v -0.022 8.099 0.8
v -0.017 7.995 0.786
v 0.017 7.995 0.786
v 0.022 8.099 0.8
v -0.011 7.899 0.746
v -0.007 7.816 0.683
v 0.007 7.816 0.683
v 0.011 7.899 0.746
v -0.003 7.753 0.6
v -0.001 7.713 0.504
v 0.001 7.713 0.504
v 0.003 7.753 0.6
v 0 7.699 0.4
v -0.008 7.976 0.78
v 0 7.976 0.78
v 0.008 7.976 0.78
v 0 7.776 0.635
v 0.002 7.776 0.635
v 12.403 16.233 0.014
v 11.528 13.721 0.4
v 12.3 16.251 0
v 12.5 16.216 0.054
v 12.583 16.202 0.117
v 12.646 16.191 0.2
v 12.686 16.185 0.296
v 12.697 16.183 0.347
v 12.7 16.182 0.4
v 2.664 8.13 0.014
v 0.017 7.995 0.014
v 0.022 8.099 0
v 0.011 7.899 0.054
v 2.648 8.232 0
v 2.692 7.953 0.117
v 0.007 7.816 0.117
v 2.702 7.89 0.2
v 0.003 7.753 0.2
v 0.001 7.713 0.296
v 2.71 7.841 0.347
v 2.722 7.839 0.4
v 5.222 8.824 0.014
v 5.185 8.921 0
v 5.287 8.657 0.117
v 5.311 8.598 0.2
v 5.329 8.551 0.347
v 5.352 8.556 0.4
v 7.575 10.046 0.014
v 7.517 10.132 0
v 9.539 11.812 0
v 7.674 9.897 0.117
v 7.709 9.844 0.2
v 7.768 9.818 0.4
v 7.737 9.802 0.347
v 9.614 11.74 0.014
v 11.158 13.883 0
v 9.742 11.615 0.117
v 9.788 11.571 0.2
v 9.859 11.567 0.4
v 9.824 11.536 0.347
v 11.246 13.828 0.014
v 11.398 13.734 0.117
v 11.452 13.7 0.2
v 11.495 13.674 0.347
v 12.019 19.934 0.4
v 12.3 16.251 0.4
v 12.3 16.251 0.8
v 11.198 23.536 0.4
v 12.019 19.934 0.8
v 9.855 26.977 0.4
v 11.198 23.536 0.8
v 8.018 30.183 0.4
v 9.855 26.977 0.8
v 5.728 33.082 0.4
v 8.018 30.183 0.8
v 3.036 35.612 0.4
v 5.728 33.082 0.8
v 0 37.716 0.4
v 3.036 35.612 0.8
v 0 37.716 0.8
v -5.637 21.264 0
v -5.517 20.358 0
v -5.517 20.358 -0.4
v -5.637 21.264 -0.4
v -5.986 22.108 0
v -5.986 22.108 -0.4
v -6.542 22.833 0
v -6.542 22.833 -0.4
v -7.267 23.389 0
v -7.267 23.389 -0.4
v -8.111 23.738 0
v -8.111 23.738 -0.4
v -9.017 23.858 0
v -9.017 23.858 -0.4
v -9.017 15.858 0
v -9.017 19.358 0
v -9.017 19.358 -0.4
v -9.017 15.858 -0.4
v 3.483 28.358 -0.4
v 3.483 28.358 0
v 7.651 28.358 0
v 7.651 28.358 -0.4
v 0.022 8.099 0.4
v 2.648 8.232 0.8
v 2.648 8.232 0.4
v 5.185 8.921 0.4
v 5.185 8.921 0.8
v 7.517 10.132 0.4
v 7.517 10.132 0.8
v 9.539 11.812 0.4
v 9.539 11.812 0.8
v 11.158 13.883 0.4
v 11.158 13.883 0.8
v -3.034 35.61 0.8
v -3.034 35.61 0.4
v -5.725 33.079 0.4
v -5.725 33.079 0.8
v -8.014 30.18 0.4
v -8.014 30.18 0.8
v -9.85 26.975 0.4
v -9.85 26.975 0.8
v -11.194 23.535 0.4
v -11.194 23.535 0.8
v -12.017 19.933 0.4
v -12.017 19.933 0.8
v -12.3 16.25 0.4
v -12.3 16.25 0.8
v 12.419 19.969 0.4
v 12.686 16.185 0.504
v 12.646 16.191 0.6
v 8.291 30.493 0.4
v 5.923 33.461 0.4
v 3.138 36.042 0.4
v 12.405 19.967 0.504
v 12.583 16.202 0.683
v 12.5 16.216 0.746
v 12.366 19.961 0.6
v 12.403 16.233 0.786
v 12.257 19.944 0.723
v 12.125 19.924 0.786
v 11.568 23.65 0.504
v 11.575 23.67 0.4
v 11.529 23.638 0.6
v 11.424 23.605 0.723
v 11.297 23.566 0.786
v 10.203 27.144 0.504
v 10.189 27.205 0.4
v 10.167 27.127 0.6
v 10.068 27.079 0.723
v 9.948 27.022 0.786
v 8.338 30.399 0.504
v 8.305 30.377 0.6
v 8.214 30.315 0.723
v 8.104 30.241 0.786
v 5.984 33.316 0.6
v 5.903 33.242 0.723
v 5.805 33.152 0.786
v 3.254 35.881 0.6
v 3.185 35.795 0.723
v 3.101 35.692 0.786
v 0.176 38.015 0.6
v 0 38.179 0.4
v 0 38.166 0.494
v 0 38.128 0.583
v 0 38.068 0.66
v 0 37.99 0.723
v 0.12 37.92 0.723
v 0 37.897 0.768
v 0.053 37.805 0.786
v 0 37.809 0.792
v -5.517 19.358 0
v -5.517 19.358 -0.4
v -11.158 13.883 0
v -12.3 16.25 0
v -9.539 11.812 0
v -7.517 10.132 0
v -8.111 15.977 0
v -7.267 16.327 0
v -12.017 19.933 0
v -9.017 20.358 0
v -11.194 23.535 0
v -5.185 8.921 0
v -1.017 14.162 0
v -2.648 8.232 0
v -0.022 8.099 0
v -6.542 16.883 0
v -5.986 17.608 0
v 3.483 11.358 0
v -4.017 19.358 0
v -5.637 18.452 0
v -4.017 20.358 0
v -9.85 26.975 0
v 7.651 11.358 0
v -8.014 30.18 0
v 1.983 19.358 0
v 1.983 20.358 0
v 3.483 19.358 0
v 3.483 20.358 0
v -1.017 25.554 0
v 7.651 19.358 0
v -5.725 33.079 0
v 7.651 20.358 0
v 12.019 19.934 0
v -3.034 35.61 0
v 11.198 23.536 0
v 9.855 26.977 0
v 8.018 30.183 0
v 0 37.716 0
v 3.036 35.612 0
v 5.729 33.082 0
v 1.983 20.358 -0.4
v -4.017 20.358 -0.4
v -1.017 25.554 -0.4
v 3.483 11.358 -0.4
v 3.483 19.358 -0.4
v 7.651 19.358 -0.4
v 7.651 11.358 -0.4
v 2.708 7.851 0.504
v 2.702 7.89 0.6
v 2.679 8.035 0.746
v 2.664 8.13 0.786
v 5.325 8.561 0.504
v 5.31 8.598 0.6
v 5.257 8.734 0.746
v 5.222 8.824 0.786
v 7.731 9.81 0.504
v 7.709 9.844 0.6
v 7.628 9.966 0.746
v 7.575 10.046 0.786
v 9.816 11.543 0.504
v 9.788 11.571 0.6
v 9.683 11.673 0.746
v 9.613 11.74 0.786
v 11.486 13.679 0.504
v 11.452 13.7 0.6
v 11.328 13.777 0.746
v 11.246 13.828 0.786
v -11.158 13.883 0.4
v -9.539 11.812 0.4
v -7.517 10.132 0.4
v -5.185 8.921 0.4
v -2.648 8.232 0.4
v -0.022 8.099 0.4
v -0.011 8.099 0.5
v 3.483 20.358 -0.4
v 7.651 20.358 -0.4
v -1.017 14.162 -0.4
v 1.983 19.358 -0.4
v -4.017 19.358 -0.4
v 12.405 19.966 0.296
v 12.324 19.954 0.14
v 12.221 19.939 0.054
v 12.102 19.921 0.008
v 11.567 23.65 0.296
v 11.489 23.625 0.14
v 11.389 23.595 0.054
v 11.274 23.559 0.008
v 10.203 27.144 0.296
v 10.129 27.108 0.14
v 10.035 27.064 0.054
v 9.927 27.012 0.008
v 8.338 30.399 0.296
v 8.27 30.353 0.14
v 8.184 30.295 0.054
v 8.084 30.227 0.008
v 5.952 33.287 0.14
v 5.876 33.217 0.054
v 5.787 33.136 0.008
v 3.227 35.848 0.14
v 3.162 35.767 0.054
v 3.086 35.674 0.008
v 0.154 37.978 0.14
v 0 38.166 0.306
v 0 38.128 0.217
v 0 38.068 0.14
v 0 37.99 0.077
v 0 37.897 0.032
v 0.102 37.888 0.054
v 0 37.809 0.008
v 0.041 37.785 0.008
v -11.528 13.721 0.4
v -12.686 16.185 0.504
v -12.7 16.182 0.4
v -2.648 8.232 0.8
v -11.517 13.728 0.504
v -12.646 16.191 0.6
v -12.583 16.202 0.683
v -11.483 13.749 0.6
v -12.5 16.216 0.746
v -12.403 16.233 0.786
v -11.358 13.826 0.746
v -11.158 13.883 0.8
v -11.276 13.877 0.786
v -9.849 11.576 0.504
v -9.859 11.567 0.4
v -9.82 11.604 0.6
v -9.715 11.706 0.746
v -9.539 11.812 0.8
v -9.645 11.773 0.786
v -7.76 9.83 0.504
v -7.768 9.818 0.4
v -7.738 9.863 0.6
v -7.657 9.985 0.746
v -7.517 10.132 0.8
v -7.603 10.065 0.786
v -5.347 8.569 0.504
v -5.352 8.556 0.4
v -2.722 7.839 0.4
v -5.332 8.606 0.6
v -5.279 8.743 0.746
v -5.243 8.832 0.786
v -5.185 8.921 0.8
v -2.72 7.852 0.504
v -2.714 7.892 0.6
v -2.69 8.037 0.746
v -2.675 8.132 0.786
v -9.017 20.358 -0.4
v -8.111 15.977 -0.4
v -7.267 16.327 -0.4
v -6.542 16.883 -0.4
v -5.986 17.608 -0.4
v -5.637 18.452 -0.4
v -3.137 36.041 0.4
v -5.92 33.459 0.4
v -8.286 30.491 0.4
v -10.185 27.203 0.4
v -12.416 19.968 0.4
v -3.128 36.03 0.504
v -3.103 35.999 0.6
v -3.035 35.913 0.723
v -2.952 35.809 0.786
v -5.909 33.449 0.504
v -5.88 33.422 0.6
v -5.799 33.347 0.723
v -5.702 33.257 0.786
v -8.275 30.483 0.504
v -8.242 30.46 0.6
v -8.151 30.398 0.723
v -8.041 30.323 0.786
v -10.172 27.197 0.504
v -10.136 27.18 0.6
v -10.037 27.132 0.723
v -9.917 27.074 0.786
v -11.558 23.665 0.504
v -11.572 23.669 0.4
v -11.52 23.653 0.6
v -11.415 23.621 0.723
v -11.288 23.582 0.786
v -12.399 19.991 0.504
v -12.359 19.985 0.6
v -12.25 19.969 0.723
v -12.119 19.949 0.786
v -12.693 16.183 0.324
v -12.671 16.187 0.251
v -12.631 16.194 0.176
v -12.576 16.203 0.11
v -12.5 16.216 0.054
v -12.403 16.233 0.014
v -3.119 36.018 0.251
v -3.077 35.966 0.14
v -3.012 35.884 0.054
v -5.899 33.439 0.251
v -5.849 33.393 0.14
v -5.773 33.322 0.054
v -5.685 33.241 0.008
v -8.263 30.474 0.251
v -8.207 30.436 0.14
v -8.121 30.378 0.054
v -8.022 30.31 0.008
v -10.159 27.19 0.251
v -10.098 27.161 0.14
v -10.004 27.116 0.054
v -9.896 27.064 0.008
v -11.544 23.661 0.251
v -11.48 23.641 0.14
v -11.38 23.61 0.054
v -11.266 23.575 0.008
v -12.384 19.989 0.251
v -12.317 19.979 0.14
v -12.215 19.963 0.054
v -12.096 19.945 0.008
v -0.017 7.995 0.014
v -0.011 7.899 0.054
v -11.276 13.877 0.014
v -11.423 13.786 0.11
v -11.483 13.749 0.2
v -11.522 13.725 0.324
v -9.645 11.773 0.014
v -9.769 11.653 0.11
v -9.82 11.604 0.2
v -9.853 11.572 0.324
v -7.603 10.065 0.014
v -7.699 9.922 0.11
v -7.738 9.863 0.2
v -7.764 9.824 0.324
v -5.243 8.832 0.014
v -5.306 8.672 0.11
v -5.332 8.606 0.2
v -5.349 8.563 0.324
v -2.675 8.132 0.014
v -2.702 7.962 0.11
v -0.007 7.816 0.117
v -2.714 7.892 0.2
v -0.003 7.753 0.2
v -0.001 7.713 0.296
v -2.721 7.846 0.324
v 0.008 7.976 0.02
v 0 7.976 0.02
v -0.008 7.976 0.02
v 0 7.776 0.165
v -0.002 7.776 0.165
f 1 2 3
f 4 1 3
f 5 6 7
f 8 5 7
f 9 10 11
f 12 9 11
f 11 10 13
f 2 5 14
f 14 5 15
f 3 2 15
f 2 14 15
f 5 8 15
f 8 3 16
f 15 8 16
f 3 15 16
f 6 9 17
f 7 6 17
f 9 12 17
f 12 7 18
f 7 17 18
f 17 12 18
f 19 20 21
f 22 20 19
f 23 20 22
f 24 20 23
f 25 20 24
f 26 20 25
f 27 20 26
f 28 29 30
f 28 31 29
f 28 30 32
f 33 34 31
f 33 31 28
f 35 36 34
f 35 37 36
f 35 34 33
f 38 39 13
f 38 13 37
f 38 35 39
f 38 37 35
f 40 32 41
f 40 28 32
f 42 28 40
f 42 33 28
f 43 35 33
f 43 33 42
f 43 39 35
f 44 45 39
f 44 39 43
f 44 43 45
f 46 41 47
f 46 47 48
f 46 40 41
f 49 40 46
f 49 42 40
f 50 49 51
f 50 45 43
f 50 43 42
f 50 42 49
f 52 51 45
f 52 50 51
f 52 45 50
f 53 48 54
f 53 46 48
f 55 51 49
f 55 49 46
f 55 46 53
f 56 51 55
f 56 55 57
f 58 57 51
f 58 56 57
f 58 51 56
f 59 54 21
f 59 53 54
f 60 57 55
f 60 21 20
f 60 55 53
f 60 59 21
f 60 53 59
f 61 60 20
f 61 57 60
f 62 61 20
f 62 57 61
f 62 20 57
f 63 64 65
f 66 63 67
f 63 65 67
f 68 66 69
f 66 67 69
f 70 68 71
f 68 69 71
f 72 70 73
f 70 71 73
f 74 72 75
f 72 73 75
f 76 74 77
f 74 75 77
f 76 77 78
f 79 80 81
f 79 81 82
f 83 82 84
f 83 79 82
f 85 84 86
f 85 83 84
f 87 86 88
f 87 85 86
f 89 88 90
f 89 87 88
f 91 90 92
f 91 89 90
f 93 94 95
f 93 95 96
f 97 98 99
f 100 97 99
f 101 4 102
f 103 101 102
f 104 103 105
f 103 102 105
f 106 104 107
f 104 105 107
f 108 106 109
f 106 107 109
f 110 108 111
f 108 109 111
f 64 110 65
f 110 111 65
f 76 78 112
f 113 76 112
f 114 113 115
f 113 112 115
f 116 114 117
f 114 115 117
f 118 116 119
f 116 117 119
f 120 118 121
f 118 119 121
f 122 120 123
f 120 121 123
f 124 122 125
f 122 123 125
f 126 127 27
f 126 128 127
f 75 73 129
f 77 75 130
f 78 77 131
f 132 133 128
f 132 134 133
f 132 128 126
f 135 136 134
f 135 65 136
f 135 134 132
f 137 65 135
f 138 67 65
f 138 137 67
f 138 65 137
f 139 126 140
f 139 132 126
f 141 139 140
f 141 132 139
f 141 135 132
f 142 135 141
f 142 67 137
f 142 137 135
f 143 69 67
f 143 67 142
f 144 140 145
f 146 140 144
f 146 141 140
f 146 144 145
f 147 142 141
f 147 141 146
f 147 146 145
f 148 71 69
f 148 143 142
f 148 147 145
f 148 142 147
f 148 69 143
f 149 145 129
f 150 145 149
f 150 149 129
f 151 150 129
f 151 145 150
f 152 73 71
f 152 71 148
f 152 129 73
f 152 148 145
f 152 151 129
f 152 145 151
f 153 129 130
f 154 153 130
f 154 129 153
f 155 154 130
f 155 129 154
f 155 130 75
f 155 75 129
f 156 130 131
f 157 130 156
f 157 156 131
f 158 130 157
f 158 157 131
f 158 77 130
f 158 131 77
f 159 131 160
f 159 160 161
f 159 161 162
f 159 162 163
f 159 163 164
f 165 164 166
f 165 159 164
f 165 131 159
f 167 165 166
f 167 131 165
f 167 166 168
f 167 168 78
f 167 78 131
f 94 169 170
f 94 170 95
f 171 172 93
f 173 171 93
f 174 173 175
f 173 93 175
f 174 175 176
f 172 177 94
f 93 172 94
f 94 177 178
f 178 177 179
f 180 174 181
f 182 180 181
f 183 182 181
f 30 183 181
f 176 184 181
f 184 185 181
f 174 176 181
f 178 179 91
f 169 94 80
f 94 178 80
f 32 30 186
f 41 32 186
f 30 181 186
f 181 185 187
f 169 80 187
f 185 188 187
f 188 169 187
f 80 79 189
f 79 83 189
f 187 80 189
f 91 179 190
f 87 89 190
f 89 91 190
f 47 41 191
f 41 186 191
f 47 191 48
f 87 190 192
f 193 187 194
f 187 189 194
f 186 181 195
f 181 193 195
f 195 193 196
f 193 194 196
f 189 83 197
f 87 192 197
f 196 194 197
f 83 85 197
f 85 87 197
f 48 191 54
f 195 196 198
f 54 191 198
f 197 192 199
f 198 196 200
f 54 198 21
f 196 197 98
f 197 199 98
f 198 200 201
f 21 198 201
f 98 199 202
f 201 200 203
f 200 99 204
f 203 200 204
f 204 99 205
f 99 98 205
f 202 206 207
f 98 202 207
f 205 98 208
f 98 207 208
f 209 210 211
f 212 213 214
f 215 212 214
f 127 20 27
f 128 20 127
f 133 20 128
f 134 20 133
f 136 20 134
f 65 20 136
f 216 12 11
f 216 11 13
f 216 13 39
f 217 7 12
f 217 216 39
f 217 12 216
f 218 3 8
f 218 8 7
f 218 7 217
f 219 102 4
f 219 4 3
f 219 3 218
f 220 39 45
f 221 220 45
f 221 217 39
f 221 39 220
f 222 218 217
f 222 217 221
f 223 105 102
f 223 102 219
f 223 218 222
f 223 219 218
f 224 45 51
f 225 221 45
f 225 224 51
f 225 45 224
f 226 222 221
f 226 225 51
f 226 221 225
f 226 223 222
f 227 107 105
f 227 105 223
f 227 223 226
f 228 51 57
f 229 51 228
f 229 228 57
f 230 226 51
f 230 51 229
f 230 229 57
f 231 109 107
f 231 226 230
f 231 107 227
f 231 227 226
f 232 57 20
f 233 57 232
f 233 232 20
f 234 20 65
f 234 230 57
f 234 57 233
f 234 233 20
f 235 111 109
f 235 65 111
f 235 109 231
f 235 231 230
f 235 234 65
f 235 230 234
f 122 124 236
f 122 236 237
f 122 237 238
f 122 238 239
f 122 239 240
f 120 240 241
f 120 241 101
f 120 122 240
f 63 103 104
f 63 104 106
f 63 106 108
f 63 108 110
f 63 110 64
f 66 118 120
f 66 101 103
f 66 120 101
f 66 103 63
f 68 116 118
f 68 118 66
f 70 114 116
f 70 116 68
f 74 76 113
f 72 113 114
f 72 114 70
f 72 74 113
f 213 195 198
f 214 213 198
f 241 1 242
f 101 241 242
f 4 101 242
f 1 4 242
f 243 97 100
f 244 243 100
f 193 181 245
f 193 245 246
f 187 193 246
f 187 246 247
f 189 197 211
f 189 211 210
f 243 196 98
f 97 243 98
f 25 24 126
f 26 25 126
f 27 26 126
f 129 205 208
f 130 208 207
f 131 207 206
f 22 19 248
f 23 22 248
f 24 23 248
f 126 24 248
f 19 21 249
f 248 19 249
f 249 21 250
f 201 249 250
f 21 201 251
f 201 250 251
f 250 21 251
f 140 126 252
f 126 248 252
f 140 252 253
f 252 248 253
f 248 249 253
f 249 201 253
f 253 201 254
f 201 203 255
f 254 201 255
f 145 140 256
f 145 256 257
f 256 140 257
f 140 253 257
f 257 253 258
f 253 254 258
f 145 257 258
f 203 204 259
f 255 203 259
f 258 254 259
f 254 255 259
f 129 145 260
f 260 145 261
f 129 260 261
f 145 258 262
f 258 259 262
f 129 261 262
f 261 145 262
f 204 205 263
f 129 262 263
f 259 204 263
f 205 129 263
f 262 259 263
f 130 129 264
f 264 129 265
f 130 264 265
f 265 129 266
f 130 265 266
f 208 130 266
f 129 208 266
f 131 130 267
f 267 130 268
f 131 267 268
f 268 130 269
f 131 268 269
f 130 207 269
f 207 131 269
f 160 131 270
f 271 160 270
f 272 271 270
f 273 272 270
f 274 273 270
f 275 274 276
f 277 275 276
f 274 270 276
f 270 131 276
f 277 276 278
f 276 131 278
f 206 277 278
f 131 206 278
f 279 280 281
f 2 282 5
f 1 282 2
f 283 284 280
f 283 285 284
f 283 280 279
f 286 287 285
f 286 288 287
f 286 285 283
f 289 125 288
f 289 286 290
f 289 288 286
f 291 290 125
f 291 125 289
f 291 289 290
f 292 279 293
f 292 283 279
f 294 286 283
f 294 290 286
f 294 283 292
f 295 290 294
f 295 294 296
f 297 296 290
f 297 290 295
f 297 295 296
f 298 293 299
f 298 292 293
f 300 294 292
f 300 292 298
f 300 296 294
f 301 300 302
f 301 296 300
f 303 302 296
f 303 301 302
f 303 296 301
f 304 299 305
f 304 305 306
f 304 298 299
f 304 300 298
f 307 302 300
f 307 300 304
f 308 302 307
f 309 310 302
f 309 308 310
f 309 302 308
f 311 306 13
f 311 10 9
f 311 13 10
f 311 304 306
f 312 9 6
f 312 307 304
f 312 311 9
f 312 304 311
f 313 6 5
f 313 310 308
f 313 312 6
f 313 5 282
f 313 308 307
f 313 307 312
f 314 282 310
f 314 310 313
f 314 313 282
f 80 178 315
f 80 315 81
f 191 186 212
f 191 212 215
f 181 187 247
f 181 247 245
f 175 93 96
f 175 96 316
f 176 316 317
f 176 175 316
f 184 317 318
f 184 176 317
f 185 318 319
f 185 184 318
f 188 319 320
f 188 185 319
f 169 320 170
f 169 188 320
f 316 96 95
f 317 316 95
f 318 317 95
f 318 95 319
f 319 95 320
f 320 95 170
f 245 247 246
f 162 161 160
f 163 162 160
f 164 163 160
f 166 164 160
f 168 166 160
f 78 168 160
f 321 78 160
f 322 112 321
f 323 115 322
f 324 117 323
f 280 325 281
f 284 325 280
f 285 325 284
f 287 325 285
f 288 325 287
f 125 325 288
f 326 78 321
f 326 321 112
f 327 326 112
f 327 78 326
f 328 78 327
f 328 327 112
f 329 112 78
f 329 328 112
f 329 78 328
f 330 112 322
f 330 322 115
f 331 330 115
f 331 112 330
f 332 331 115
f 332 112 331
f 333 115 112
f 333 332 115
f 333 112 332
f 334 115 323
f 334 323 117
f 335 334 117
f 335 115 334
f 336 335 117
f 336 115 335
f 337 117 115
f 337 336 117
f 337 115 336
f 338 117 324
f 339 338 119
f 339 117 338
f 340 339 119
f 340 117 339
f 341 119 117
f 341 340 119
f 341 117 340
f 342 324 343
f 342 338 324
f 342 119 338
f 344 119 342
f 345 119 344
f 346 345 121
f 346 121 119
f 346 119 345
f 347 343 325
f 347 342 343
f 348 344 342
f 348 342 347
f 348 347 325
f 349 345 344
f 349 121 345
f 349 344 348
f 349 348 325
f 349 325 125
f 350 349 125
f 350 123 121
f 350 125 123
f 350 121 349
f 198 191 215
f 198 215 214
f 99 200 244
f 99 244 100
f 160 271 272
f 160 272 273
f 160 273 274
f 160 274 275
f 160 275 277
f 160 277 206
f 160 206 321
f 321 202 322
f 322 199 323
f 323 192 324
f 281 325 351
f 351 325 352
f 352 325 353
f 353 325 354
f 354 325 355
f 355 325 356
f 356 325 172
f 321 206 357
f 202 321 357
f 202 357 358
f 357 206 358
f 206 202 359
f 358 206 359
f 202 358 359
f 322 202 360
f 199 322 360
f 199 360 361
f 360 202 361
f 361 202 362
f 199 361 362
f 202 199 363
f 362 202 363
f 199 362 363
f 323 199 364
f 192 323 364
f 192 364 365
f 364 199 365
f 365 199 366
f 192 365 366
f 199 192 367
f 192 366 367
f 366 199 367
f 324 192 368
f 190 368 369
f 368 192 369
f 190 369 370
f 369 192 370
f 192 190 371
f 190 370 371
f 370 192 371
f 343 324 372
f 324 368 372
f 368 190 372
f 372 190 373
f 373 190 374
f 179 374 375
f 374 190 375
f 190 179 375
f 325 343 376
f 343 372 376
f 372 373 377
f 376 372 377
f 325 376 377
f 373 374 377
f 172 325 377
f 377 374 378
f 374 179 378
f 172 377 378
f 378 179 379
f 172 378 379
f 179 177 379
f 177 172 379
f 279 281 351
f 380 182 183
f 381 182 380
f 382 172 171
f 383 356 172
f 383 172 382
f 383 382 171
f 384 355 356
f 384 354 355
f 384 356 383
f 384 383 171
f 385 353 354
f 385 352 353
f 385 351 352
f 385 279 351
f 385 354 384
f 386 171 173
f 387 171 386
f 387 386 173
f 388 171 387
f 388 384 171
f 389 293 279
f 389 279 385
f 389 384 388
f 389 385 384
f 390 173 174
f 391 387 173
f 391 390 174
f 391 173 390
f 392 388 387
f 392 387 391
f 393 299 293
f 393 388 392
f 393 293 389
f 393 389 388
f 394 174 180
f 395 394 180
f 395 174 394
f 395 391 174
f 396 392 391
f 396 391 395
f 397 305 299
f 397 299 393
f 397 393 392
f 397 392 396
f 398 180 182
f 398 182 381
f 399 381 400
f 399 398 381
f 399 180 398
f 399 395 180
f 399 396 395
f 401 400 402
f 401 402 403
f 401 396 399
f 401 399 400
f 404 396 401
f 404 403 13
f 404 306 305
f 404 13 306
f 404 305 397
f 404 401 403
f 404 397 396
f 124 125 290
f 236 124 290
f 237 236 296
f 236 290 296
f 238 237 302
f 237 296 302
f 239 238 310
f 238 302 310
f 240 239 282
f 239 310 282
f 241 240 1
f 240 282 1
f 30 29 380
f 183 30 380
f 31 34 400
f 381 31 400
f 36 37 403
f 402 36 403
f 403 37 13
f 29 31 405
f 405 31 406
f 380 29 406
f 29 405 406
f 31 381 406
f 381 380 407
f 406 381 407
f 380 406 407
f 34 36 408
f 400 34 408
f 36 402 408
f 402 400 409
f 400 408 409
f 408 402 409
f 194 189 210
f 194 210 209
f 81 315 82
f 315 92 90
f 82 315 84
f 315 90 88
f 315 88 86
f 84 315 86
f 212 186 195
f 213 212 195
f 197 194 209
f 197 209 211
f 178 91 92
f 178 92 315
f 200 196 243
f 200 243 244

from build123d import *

# Parameters (mm, degrees)
F1_DEPTH = 0.8
F2_R     = 0.4
F3_R     = 0.39999
F4_W     = 4.168279469
F4_H     = 8
F5_DEPTH = 0.4
F6_DEPTH = 0.4


# Not quite as in the source:
# - a fillet or chamfer is up to 0.001 mm smaller than in the source, because OpenCascade refuses the exact size


with BuildPart() as f1:
    # F0 (on Top) → F1 (new body)
    with BuildSketch(Plane.XY):
        with BuildLine():
            ThreePointArc((0, 38.1792416396), (-9.2970452561, 28.8821963835), (-12.7, 16.1821963835))
            ThreePointArc((-12.7, 16.1821963835), (-7.7676026835, 9.8183978835), (0, 7.6992416396))
            ThreePointArc((0, 7.6992416396), (7.7676026835, 9.8183978835), (12.7, 16.1821963835))
            ThreePointArc((12.7, 16.1821963835), (9.3014350381, 28.8847308253), (0, 38.1792416396))
        make_face()
    extrude(amount=F1_DEPTH)

    # F2
    f2_edges = [f1.edges().sort_by_distance(p)[0] for p in [
        (-9.297045, 28.882196, 0.8),
        (-7.767603, 9.818398, 0.8),
        (7.767603, 9.818398, 0.8),
        (9.301435, 28.884731, 0.8),
    ]]
    fillet(f2_edges, radius=F2_R)

    # F3 (radius 0.4 in the source; OpenCascade refuses exactly that, so slightly less here)
    f3_edges = [f1.edges().sort_by_distance(p)[0] for p in [
        (7.767603, 9.818398, 0),
        (9.301435, 28.884731, 0),
        (-7.767603, 9.818398, 0),
        (-9.297045, 28.882196, 0),
    ]]
    fillet(f3_edges, radius=F3_R)

    # F4 (on Top) + F1_face (on face) + F1_face1 (on face) → F5 (cut)
    with BuildSketch(Plane.XY):
        Polygon((1.9827442754, 19.357689971), (-4.0172557246, 19.357689971), (-1.0172557246, 14.1615375483), align=None)
        with BuildLine():
            Line((-9.0172557246, 19.357689971), (-9.0172557246, 15.857689971))
            ThreePointArc((-9.0172557246, 15.857689971), (-6.5423819904, 16.8828162368), (-5.5172557246, 19.357689971))
            Line((-5.5172557246, 19.357689971), (-9.0172557246, 19.357689971))
        make_face()
        Polygon((-1.0172557246, 25.5538423937), (-4.0172557246, 20.357689971), (1.9827442754, 20.357689971), align=None)
        with Locations((5.56688401, 15.357689971)):
            Rectangle(F4_W, F4_H)
        with BuildLine():
            Line((-9.0172557246, 20.357689971), (-5.5172557246, 20.357689971))
            ThreePointArc((-5.5172557246, 20.357689971), (-6.5423819904, 22.8325637051), (-9.0172557246, 23.857689971))
            Line((-9.0172557246, 23.857689971), (-9.0172557246, 20.357689971))
        make_face()
        with Locations((5.56688401, 24.357689971)):
            Rectangle(F4_W, F4_H)
    with BuildSketch(Plane(origin=(0.0014081173, 21.2624606857, 0.8), x_dir=(1, 0, 0), z_dir=(0, 0, 1))):
        with BuildLine():
            ThreePointArc((-0.0012370935, 16.4537632815), (-8.9926932828, 7.3490618207), (-12.3013148115, -5.0119614651))
            ThreePointArc((-12.3013148115, -5.0119614651), (-7.5186387645, -11.1302175722), (-0.0238816927, -13.1638508721))
            add(Edge.make_bspline(
                [(-0.0238816927, -13.1638508721), (-0.0125655835, -13.1632140826), (-0.0014081173, -13.1622533084), (0.009749349, -13.1632140826), (0.0210654582, -13.1638508721)],
                knots=[0, 0, 0, 0, 0, 1, 1, 1, 1, 1], degree=4))
            ThreePointArc((0.0210654582, -13.1638508721), (7.5158860187, -11.1301754171), (12.2985497378, -5.0118178891))
            ThreePointArc((12.2985497378, -5.0118178891), (8.9943044567, 7.3515302466), (-0.0012370935, 16.4537632815))
        make_face()
    with BuildSketch(Plane(origin=(0.001408117, 21.262461098, 0), x_dir=(1, 0, 0), z_dir=(0, 0, -1))):
        with BuildLine():
            ThreePointArc((12.2985597415, 5.0118200202), (7.5158922747, 11.1301836793), (0.0210648966, 13.1638612686))
            add(Edge.make_bspline(
                [(0.0210648966, 13.1638612686), (0.0097490703, 13.1632244951), (-0.001408117, 13.1622637449), (-0.0125653043, 13.1632244951), (-0.0238811306, 13.1638612686)],
                knots=[0, 0, 0, 0, 0, 1, 1, 1, 1, 1], degree=4))
            ThreePointArc((-0.0238811306, 13.1638612686), (-7.5186450215, 11.1302258334), (-12.301324816, 5.0119635927))
            ThreePointArc((-12.301324816, 5.0119635927), (-8.9927009274, -7.3490681805), (-0.0012370975, -16.4537744762))
            ThreePointArc((-0.0012370975, -16.4537744762), (8.9943121009, -7.3515366081), (12.2985597415, 5.0118200202))
        make_face()
    extrude(amount=-F5_DEPTH, dir=(0, 0, 1), mode=Mode.SUBTRACT)

    # F4 (on Top) → F6 (join)
    with BuildSketch(Plane.XY):
        with BuildLine():
            Line((-9.0172557246, 19.357689971), (-9.0172557246, 15.857689971))
            ThreePointArc((-9.0172557246, 15.857689971), (-6.5423819904, 16.8828162368), (-5.5172557246, 19.357689971))
            Line((-5.5172557246, 19.357689971), (-9.0172557246, 19.357689971))
        make_face()
        with BuildLine():
            Line((-9.0172557246, 20.357689971), (-5.5172557246, 20.357689971))
            ThreePointArc((-5.5172557246, 20.357689971), (-6.5423819904, 22.8325637051), (-9.0172557246, 23.857689971))
            Line((-9.0172557246, 23.857689971), (-9.0172557246, 20.357689971))
        make_face()
        Polygon((-1.0172557246, 25.5538423937), (-4.0172557246, 20.357689971), (1.9827442754, 20.357689971), align=None)
        Polygon((1.9827442754, 19.357689971), (-4.0172557246, 19.357689971), (-1.0172557246, 14.1615375483), align=None)
        with Locations((5.56688401, 24.357689971)):
            Rectangle(F4_W, F4_H)
        with Locations((5.56688401, 15.357689971)):
            Rectangle(F4_W, F4_H)
    extrude(amount=-F6_DEPTH)


solid = f1.part
